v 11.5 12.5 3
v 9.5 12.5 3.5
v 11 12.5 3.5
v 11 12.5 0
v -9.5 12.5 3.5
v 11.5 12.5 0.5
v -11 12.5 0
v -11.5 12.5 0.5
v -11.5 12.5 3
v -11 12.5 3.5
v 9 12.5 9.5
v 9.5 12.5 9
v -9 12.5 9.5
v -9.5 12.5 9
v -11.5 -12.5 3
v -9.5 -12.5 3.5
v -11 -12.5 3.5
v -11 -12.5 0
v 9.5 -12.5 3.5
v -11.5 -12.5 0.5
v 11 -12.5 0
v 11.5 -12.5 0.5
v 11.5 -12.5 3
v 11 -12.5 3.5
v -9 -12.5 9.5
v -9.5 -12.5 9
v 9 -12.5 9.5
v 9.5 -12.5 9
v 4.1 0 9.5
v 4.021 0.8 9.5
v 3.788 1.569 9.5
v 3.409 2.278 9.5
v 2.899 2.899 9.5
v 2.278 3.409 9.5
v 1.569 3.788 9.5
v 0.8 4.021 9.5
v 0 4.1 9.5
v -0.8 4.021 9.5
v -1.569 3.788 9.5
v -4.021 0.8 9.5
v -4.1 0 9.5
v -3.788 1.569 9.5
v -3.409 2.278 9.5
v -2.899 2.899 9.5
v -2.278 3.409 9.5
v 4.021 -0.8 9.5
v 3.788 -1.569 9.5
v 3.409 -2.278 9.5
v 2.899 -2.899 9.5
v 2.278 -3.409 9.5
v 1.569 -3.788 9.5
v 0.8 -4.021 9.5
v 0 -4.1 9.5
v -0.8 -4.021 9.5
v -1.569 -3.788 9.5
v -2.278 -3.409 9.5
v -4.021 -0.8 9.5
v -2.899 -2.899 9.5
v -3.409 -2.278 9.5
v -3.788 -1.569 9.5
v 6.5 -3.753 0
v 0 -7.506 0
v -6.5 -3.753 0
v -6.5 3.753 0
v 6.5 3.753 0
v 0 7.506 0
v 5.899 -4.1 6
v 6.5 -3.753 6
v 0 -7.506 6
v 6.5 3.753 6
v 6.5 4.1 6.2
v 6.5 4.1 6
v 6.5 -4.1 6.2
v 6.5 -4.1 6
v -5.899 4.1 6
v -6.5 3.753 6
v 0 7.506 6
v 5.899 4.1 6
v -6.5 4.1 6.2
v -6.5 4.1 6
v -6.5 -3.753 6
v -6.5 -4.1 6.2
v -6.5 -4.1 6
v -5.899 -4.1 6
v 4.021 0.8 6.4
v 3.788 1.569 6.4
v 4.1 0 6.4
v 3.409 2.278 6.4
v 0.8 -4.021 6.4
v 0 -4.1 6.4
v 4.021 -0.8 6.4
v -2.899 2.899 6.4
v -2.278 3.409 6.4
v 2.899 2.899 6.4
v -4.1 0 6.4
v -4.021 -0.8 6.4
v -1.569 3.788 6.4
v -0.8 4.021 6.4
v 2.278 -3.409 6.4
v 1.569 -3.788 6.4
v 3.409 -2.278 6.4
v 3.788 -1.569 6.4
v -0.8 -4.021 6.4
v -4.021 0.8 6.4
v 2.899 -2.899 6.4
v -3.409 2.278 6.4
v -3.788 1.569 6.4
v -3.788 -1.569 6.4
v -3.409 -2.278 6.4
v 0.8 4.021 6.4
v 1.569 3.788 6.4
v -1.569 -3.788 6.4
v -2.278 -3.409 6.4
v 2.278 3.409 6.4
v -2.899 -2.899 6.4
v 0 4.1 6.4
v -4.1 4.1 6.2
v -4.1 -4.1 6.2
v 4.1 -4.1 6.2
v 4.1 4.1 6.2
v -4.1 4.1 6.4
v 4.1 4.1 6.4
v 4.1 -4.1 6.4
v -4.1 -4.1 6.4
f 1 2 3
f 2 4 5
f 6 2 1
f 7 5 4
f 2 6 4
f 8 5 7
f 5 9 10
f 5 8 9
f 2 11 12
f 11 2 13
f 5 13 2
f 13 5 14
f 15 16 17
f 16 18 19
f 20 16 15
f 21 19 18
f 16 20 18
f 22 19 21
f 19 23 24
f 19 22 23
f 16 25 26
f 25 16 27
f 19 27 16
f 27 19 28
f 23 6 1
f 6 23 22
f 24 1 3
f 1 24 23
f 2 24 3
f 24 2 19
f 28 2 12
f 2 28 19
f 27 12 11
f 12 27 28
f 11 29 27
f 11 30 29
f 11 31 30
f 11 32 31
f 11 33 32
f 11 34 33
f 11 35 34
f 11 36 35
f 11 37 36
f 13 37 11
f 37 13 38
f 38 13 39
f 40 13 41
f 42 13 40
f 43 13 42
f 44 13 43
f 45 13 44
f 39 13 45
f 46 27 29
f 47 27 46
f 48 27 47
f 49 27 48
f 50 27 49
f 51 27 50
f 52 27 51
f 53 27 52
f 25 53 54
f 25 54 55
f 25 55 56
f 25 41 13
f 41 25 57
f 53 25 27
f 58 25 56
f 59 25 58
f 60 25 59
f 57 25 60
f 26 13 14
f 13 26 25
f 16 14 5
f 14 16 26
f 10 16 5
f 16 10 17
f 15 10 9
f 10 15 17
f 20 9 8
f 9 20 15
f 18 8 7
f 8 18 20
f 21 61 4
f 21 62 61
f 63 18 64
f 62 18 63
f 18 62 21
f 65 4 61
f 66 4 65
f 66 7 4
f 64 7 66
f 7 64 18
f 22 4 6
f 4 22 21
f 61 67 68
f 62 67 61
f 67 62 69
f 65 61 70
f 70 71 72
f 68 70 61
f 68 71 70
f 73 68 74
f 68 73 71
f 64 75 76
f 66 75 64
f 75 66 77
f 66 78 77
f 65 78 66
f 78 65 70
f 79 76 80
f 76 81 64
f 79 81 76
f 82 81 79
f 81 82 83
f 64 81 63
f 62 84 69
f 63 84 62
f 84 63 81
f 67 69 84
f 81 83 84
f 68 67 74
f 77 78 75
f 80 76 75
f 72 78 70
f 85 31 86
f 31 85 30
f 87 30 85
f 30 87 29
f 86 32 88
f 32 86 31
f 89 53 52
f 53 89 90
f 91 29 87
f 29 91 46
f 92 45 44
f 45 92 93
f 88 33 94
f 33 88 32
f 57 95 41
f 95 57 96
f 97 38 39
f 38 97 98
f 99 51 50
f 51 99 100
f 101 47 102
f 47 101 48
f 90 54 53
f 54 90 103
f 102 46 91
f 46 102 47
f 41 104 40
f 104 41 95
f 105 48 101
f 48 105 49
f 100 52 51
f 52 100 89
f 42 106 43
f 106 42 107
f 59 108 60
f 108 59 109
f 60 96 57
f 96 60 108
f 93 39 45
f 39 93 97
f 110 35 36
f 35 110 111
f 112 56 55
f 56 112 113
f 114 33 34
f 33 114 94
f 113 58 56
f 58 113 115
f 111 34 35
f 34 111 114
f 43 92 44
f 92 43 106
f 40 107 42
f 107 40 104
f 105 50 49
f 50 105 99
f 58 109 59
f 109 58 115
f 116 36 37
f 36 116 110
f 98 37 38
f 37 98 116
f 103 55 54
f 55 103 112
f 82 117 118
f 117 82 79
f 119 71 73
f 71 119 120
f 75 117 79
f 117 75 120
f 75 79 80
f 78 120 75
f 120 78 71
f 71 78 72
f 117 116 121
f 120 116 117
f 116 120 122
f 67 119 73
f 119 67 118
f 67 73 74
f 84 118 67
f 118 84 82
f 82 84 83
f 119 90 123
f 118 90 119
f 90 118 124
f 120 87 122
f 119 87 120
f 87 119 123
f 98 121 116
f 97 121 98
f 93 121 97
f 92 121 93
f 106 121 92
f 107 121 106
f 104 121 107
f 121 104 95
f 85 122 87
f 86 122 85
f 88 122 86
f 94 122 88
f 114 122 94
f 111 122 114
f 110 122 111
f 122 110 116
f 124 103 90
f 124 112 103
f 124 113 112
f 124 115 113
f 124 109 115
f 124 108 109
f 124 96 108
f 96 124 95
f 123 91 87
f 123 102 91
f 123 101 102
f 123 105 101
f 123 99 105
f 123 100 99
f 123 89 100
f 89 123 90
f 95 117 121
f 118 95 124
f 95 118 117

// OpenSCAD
// T-Track Bolt Insert — Parametric Model
// All dimensions in mm
//
// Orientation:
//   Lip (wide)    = BOTTOM — sits inside the T-track channel
//   Slot (narrow) = TOP    — protrudes through the slot opening
//   Bolt head pocket is recessed into the bottom of the lip section
//   Bolt shaft points upward through the full height

// --- T-Track Profile ---
slot_width = 19;   // Width of the narrow slot section (bottom)
lip_width  = 23;   // Width of the wide lip section (top)
slot_depth = 6;    // Height of the slot section
lip_depth  = 3.5;    // Height of the lip section

// --- Bolt Dimensions ---
head_width     = 13;  // Hex head flat-to-flat width
head_height    = 6;   // Hex head thickness
shaft_diameter = 8.2;   // Bolt shaft clearance diameter

// --- Insert Dimensions ---
insert_length = 25;

// --- Print Settings ---
layer_height = 0.2;  // Bridge step depth at top of hex pocket (enables support-free printing)

// --- Fixed ---
chamfer = 0.5;

// Derived
total_depth = slot_depth + lip_depth;
head_radius = head_width / 2 / cos(30);

// T cross-section in the XY plane (X = width, Y = height).
// Lip (wide) at bottom (Y=0), Slot (narrow) at top (Y=total_depth).
// Chamfered corners (long-edge corners only):
//   - bottom-left and bottom-right of lip
//   - step corners at top of lip (outer only; inner junction stays sharp)
//   - top-left and top-right of slot
function t_cross_section(sw, lw, sd, ld, ch) = [
    [-lw/2 + ch,  0       ],  // bottom-left of lip   (chamfered)
    [-lw/2,       ch      ],
    [-lw/2,       ld - ch ],
    [-lw/2 + ch,  ld      ],  // step left top        (chamfered)
    [-sw/2,       ld      ],  // junction left        (sharp)
    [-sw/2,       ld+sd-ch],
    [-sw/2 + ch,  ld+sd   ],  // top-left of slot     (chamfered)
    [ sw/2 - ch,  ld+sd   ],  // top-right of slot    (chamfered)
    [ sw/2,       ld+sd-ch],
    [ sw/2,       ld      ],  // junction right       (sharp)
    [ lw/2 - ch,  ld      ],  // step right top       (chamfered)
    [ lw/2,       ld - ch ],
    [ lw/2,       ch      ],
    [ lw/2 - ch,  0       ],  // bottom-right of lip  (chamfered)
];

module t_body() {
    // Extrude the cross-section along Y (insert length direction).
    // rotate([90,0,0]) maps polygon Y → 3D Z, extrusion Z → 3D -Y,
    // then translate centres it on Y=0.
    translate([0, insert_length / 2, 0])
    rotate([90, 0, 0])
    linear_extrude(insert_length)
        polygon(t_cross_section(slot_width, lip_width, slot_depth, lip_depth, chamfer));
}

module hex_pocket() {
    // Hex bolt head recess cut into the bottom of the slot section (Z=0 face).
    // Rotated 30° so flat faces are parallel to the slot walls (±X), minimising width.
    translate([0, 0, -0.01])
        rotate([0, 0, 30])
            cylinder(h = head_height + 0.01, r = head_radius, $fn = 6);
}

module shaft_hole() {
    // Clearance hole for bolt shaft through the full height
    translate([0, 0, -0.01])
        cylinder(h = total_depth + 0.02, d = shaft_diameter, $fn = 32);
}

module bridge_step() {
    // Thin rectangular slot at the ceiling of the hex pocket (Z = head_height).
    // Width matches the shaft hole so the printer can bridge without supports.
    translate([-head_width/2, -shaft_diameter/2, head_height])
        cube([head_width, shaft_diameter, layer_height]);
}

module bridge_step_square() {
    // Square slot one layer above the first bridge step.
    // head_width × head_width, centered on the shaft hole.
    translate([-shaft_diameter/2, -shaft_diameter/2, head_height + layer_height])
        cube([shaft_diameter, shaft_diameter, layer_height]);
}

difference() {
    t_body();
    hex_pocket();
    shaft_hole();
    bridge_step();
    bridge_step_square();
}
